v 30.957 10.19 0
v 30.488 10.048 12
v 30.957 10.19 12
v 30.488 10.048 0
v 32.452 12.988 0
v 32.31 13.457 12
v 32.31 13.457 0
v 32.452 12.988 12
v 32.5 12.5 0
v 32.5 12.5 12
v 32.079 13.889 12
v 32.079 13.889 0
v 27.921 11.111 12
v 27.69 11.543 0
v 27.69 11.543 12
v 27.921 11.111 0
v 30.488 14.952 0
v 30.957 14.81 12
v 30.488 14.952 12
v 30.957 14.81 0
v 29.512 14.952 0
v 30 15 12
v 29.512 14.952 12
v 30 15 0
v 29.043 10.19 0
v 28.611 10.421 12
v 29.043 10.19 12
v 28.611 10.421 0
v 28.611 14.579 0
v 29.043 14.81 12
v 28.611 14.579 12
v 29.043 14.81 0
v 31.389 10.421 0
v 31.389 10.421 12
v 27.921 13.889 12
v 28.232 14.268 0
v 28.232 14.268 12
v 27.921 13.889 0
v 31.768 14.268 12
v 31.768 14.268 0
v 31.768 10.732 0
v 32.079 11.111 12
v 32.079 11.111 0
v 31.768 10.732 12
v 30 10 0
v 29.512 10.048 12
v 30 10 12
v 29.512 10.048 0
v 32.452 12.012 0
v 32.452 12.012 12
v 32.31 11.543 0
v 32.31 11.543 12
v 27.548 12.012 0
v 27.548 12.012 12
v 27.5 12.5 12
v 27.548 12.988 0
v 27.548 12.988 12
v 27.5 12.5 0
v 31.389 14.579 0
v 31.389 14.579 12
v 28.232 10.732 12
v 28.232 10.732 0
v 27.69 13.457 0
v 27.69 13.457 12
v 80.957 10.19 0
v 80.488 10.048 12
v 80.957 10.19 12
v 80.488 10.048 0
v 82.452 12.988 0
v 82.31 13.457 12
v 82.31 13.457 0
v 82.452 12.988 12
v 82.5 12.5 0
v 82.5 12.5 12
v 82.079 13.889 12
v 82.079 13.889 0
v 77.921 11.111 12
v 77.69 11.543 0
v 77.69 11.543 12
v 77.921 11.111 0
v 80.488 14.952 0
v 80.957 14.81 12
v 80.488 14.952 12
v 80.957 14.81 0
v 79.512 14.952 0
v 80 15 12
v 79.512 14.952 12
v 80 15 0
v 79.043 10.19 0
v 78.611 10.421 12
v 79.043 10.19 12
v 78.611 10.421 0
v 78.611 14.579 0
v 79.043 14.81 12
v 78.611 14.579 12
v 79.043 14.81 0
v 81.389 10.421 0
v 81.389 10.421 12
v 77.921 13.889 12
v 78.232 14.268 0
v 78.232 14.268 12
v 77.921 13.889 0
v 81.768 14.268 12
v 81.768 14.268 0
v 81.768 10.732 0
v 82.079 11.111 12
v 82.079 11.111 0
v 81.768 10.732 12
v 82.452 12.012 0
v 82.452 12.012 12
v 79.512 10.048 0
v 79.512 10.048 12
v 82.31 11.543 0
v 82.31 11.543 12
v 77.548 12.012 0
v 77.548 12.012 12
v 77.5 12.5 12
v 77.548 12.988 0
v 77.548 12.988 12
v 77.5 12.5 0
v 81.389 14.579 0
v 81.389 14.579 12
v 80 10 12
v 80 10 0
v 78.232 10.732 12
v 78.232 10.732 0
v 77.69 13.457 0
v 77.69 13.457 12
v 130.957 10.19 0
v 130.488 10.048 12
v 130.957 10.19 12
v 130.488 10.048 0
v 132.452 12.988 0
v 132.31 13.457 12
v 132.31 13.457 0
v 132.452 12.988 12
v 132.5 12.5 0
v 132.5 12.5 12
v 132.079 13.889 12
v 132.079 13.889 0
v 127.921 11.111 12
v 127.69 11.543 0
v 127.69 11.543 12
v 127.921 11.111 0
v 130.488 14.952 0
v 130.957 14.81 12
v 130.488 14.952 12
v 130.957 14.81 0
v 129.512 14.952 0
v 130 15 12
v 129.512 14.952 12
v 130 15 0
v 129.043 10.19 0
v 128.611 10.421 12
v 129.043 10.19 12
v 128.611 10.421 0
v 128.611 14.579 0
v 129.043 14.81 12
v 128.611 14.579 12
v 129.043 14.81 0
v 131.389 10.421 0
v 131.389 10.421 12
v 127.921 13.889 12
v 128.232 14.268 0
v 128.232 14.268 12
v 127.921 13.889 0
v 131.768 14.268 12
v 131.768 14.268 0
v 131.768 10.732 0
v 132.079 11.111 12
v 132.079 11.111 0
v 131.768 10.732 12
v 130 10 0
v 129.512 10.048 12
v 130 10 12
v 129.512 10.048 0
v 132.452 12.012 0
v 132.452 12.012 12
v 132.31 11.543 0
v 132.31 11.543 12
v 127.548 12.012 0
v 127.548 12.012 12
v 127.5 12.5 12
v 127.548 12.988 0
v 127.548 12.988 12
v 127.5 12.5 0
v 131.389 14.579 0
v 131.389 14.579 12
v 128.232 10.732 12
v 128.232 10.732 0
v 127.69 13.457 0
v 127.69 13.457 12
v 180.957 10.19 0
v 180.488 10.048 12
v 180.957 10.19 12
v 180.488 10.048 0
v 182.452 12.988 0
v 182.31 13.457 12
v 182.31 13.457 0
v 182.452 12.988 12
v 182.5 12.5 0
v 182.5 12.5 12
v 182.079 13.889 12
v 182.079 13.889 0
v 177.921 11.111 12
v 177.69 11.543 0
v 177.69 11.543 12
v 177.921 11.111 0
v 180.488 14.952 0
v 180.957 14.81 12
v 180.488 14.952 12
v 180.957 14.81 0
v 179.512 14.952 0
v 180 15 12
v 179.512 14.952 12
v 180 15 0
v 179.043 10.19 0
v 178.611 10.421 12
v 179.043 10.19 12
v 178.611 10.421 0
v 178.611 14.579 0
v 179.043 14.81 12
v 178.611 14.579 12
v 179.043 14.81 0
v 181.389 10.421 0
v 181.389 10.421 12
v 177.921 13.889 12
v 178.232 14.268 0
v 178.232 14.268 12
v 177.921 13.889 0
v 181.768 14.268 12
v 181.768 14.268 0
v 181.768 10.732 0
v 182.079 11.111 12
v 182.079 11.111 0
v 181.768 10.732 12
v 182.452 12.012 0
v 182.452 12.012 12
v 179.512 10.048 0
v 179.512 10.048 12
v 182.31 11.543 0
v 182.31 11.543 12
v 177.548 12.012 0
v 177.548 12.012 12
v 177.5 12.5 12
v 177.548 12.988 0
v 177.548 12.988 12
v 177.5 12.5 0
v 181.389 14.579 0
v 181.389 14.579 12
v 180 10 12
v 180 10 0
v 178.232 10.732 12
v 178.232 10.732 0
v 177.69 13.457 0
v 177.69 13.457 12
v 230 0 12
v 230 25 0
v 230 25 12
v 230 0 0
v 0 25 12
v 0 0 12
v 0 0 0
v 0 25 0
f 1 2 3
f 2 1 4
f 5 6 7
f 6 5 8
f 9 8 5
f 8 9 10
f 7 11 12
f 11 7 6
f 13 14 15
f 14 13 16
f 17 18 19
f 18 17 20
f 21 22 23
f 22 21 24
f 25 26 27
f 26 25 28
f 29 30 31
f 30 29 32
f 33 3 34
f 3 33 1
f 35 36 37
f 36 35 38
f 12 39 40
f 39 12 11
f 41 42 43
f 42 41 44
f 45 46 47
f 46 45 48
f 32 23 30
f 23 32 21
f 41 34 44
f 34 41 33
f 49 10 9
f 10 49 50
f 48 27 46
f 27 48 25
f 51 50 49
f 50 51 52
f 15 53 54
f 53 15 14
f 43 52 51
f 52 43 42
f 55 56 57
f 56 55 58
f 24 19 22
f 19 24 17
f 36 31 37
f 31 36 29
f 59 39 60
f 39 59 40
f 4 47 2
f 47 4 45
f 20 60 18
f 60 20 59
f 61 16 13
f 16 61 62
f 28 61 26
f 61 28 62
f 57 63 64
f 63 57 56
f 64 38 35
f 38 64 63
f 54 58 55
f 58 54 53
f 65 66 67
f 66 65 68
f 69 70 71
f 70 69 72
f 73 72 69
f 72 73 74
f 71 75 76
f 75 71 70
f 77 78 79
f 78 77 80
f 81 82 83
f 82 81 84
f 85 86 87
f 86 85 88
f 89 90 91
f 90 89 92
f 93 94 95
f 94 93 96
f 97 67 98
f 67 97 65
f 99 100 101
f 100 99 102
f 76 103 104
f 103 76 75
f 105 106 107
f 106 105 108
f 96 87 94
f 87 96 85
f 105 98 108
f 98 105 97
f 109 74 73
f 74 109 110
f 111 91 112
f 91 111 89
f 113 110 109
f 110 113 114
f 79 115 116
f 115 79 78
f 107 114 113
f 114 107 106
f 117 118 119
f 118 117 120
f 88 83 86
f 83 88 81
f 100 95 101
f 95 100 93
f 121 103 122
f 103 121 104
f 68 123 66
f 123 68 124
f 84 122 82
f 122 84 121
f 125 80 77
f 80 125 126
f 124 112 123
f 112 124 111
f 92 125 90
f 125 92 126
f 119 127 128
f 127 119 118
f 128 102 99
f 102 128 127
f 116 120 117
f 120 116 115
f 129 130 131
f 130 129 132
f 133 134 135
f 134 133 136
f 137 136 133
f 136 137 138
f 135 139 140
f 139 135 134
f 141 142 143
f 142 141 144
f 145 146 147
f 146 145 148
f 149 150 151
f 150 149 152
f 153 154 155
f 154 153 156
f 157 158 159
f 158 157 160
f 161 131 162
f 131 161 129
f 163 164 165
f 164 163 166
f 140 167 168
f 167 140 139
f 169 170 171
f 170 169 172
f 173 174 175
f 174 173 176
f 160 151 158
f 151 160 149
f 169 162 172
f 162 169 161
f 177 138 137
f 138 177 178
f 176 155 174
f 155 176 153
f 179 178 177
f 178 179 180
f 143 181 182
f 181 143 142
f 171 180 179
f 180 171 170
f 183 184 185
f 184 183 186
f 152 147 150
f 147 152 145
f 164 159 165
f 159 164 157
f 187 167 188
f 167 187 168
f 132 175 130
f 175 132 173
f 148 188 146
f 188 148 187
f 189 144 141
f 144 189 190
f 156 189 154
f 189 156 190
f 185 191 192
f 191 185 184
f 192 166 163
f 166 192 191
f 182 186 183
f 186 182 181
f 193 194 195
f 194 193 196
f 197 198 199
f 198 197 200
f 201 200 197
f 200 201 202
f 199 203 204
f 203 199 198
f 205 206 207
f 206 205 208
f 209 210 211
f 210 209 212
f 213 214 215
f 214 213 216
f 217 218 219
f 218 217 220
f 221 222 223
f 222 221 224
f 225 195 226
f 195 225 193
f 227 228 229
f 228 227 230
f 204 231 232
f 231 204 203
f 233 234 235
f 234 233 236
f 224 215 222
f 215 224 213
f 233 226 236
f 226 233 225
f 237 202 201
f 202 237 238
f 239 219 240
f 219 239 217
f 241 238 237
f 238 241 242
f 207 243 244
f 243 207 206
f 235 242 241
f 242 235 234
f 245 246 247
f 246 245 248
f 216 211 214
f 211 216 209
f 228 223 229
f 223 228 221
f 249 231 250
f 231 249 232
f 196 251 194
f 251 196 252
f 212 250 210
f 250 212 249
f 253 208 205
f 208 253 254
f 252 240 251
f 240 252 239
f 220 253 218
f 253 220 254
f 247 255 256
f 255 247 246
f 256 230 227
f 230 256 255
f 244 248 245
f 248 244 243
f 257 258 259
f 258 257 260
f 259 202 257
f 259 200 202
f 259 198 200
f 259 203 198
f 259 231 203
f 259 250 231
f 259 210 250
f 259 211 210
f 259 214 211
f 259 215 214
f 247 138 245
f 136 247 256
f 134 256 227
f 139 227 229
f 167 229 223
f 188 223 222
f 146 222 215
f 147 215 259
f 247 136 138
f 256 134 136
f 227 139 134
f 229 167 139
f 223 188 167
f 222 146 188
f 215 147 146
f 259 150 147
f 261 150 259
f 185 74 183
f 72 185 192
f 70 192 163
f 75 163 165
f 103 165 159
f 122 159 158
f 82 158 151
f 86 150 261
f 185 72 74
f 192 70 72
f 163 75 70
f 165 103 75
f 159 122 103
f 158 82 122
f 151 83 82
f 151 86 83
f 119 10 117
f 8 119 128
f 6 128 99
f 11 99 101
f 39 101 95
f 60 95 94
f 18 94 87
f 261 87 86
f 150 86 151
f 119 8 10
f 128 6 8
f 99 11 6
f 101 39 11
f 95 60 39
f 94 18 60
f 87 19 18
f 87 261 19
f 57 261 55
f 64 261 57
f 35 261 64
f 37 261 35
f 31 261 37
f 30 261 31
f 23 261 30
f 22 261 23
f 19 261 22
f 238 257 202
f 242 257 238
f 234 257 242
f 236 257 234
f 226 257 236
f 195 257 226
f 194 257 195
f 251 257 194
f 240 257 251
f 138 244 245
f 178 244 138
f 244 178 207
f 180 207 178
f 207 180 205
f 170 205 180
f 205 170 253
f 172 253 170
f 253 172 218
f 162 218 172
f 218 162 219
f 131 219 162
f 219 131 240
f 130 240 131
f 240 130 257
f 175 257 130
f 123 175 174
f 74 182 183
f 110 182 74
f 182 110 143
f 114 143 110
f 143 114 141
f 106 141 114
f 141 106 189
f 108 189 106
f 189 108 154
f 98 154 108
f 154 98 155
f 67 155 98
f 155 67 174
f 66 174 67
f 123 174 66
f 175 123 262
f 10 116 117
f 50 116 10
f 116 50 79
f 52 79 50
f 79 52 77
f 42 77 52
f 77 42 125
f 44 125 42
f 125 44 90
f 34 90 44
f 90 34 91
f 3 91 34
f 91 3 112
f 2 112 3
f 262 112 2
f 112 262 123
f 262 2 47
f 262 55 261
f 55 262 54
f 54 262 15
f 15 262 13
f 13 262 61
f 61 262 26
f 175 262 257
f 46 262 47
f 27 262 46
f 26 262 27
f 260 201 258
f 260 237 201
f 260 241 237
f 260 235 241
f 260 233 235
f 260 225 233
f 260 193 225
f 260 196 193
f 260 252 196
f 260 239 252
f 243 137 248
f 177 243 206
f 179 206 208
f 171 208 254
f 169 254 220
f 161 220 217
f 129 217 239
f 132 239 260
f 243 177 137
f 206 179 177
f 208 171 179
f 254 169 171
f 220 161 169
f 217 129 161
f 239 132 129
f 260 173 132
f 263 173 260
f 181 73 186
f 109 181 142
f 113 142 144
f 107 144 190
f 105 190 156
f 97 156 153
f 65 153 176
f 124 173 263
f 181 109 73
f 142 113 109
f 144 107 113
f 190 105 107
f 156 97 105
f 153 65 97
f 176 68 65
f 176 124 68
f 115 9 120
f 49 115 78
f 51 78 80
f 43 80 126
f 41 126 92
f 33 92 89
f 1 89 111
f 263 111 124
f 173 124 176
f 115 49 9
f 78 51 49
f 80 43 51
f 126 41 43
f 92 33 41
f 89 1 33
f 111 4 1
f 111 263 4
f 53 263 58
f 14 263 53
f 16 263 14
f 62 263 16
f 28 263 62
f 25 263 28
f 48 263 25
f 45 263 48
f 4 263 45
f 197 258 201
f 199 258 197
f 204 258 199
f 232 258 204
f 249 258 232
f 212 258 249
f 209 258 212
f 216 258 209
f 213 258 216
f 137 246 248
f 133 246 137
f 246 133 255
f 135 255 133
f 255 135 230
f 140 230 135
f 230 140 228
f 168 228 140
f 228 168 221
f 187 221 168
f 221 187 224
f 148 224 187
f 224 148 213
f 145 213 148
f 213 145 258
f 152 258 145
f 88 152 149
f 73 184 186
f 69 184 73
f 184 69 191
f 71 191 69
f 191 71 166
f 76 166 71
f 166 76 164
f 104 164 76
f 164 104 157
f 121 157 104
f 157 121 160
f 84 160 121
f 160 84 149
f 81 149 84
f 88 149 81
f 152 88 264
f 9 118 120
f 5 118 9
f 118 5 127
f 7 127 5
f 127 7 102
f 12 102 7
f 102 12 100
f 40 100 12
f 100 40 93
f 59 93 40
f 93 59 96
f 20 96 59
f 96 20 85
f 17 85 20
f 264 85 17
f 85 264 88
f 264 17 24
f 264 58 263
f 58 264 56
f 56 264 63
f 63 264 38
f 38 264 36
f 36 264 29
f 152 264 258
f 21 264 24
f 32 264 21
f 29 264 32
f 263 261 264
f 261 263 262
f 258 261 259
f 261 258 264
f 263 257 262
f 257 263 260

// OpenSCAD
$fn = 32;

// ----------------------------------------------------------------------
// Long rail: 200-250 mm mounting rail
// ----------------------------------------------------------------------

// --- parameters (mm) ---
rail_l = 230;             // rail length, X
rail_w = 25;              // rail width, Y
rail_t = 12;              // rail thickness, Z
hole_d = 5;               // mounting hole diameter
hole_start = 30;          // first hole offset from the end
hole_pitch = 50;          // hole pitch
holes = 4;                // number of holes
fit_tol = 0.1;            // tolerance for press fits, mm
free_tol = 0.5;           // tolerance for clearance fits, mm

difference() {
  cube([rail_l, rail_w, rail_t]);
  for (i = [0 : holes - 1])
    translate([hole_start + i * hole_pitch, rail_w / 2, -1])
      cylinder(h = rail_t + 2, d = hole_d);
}
